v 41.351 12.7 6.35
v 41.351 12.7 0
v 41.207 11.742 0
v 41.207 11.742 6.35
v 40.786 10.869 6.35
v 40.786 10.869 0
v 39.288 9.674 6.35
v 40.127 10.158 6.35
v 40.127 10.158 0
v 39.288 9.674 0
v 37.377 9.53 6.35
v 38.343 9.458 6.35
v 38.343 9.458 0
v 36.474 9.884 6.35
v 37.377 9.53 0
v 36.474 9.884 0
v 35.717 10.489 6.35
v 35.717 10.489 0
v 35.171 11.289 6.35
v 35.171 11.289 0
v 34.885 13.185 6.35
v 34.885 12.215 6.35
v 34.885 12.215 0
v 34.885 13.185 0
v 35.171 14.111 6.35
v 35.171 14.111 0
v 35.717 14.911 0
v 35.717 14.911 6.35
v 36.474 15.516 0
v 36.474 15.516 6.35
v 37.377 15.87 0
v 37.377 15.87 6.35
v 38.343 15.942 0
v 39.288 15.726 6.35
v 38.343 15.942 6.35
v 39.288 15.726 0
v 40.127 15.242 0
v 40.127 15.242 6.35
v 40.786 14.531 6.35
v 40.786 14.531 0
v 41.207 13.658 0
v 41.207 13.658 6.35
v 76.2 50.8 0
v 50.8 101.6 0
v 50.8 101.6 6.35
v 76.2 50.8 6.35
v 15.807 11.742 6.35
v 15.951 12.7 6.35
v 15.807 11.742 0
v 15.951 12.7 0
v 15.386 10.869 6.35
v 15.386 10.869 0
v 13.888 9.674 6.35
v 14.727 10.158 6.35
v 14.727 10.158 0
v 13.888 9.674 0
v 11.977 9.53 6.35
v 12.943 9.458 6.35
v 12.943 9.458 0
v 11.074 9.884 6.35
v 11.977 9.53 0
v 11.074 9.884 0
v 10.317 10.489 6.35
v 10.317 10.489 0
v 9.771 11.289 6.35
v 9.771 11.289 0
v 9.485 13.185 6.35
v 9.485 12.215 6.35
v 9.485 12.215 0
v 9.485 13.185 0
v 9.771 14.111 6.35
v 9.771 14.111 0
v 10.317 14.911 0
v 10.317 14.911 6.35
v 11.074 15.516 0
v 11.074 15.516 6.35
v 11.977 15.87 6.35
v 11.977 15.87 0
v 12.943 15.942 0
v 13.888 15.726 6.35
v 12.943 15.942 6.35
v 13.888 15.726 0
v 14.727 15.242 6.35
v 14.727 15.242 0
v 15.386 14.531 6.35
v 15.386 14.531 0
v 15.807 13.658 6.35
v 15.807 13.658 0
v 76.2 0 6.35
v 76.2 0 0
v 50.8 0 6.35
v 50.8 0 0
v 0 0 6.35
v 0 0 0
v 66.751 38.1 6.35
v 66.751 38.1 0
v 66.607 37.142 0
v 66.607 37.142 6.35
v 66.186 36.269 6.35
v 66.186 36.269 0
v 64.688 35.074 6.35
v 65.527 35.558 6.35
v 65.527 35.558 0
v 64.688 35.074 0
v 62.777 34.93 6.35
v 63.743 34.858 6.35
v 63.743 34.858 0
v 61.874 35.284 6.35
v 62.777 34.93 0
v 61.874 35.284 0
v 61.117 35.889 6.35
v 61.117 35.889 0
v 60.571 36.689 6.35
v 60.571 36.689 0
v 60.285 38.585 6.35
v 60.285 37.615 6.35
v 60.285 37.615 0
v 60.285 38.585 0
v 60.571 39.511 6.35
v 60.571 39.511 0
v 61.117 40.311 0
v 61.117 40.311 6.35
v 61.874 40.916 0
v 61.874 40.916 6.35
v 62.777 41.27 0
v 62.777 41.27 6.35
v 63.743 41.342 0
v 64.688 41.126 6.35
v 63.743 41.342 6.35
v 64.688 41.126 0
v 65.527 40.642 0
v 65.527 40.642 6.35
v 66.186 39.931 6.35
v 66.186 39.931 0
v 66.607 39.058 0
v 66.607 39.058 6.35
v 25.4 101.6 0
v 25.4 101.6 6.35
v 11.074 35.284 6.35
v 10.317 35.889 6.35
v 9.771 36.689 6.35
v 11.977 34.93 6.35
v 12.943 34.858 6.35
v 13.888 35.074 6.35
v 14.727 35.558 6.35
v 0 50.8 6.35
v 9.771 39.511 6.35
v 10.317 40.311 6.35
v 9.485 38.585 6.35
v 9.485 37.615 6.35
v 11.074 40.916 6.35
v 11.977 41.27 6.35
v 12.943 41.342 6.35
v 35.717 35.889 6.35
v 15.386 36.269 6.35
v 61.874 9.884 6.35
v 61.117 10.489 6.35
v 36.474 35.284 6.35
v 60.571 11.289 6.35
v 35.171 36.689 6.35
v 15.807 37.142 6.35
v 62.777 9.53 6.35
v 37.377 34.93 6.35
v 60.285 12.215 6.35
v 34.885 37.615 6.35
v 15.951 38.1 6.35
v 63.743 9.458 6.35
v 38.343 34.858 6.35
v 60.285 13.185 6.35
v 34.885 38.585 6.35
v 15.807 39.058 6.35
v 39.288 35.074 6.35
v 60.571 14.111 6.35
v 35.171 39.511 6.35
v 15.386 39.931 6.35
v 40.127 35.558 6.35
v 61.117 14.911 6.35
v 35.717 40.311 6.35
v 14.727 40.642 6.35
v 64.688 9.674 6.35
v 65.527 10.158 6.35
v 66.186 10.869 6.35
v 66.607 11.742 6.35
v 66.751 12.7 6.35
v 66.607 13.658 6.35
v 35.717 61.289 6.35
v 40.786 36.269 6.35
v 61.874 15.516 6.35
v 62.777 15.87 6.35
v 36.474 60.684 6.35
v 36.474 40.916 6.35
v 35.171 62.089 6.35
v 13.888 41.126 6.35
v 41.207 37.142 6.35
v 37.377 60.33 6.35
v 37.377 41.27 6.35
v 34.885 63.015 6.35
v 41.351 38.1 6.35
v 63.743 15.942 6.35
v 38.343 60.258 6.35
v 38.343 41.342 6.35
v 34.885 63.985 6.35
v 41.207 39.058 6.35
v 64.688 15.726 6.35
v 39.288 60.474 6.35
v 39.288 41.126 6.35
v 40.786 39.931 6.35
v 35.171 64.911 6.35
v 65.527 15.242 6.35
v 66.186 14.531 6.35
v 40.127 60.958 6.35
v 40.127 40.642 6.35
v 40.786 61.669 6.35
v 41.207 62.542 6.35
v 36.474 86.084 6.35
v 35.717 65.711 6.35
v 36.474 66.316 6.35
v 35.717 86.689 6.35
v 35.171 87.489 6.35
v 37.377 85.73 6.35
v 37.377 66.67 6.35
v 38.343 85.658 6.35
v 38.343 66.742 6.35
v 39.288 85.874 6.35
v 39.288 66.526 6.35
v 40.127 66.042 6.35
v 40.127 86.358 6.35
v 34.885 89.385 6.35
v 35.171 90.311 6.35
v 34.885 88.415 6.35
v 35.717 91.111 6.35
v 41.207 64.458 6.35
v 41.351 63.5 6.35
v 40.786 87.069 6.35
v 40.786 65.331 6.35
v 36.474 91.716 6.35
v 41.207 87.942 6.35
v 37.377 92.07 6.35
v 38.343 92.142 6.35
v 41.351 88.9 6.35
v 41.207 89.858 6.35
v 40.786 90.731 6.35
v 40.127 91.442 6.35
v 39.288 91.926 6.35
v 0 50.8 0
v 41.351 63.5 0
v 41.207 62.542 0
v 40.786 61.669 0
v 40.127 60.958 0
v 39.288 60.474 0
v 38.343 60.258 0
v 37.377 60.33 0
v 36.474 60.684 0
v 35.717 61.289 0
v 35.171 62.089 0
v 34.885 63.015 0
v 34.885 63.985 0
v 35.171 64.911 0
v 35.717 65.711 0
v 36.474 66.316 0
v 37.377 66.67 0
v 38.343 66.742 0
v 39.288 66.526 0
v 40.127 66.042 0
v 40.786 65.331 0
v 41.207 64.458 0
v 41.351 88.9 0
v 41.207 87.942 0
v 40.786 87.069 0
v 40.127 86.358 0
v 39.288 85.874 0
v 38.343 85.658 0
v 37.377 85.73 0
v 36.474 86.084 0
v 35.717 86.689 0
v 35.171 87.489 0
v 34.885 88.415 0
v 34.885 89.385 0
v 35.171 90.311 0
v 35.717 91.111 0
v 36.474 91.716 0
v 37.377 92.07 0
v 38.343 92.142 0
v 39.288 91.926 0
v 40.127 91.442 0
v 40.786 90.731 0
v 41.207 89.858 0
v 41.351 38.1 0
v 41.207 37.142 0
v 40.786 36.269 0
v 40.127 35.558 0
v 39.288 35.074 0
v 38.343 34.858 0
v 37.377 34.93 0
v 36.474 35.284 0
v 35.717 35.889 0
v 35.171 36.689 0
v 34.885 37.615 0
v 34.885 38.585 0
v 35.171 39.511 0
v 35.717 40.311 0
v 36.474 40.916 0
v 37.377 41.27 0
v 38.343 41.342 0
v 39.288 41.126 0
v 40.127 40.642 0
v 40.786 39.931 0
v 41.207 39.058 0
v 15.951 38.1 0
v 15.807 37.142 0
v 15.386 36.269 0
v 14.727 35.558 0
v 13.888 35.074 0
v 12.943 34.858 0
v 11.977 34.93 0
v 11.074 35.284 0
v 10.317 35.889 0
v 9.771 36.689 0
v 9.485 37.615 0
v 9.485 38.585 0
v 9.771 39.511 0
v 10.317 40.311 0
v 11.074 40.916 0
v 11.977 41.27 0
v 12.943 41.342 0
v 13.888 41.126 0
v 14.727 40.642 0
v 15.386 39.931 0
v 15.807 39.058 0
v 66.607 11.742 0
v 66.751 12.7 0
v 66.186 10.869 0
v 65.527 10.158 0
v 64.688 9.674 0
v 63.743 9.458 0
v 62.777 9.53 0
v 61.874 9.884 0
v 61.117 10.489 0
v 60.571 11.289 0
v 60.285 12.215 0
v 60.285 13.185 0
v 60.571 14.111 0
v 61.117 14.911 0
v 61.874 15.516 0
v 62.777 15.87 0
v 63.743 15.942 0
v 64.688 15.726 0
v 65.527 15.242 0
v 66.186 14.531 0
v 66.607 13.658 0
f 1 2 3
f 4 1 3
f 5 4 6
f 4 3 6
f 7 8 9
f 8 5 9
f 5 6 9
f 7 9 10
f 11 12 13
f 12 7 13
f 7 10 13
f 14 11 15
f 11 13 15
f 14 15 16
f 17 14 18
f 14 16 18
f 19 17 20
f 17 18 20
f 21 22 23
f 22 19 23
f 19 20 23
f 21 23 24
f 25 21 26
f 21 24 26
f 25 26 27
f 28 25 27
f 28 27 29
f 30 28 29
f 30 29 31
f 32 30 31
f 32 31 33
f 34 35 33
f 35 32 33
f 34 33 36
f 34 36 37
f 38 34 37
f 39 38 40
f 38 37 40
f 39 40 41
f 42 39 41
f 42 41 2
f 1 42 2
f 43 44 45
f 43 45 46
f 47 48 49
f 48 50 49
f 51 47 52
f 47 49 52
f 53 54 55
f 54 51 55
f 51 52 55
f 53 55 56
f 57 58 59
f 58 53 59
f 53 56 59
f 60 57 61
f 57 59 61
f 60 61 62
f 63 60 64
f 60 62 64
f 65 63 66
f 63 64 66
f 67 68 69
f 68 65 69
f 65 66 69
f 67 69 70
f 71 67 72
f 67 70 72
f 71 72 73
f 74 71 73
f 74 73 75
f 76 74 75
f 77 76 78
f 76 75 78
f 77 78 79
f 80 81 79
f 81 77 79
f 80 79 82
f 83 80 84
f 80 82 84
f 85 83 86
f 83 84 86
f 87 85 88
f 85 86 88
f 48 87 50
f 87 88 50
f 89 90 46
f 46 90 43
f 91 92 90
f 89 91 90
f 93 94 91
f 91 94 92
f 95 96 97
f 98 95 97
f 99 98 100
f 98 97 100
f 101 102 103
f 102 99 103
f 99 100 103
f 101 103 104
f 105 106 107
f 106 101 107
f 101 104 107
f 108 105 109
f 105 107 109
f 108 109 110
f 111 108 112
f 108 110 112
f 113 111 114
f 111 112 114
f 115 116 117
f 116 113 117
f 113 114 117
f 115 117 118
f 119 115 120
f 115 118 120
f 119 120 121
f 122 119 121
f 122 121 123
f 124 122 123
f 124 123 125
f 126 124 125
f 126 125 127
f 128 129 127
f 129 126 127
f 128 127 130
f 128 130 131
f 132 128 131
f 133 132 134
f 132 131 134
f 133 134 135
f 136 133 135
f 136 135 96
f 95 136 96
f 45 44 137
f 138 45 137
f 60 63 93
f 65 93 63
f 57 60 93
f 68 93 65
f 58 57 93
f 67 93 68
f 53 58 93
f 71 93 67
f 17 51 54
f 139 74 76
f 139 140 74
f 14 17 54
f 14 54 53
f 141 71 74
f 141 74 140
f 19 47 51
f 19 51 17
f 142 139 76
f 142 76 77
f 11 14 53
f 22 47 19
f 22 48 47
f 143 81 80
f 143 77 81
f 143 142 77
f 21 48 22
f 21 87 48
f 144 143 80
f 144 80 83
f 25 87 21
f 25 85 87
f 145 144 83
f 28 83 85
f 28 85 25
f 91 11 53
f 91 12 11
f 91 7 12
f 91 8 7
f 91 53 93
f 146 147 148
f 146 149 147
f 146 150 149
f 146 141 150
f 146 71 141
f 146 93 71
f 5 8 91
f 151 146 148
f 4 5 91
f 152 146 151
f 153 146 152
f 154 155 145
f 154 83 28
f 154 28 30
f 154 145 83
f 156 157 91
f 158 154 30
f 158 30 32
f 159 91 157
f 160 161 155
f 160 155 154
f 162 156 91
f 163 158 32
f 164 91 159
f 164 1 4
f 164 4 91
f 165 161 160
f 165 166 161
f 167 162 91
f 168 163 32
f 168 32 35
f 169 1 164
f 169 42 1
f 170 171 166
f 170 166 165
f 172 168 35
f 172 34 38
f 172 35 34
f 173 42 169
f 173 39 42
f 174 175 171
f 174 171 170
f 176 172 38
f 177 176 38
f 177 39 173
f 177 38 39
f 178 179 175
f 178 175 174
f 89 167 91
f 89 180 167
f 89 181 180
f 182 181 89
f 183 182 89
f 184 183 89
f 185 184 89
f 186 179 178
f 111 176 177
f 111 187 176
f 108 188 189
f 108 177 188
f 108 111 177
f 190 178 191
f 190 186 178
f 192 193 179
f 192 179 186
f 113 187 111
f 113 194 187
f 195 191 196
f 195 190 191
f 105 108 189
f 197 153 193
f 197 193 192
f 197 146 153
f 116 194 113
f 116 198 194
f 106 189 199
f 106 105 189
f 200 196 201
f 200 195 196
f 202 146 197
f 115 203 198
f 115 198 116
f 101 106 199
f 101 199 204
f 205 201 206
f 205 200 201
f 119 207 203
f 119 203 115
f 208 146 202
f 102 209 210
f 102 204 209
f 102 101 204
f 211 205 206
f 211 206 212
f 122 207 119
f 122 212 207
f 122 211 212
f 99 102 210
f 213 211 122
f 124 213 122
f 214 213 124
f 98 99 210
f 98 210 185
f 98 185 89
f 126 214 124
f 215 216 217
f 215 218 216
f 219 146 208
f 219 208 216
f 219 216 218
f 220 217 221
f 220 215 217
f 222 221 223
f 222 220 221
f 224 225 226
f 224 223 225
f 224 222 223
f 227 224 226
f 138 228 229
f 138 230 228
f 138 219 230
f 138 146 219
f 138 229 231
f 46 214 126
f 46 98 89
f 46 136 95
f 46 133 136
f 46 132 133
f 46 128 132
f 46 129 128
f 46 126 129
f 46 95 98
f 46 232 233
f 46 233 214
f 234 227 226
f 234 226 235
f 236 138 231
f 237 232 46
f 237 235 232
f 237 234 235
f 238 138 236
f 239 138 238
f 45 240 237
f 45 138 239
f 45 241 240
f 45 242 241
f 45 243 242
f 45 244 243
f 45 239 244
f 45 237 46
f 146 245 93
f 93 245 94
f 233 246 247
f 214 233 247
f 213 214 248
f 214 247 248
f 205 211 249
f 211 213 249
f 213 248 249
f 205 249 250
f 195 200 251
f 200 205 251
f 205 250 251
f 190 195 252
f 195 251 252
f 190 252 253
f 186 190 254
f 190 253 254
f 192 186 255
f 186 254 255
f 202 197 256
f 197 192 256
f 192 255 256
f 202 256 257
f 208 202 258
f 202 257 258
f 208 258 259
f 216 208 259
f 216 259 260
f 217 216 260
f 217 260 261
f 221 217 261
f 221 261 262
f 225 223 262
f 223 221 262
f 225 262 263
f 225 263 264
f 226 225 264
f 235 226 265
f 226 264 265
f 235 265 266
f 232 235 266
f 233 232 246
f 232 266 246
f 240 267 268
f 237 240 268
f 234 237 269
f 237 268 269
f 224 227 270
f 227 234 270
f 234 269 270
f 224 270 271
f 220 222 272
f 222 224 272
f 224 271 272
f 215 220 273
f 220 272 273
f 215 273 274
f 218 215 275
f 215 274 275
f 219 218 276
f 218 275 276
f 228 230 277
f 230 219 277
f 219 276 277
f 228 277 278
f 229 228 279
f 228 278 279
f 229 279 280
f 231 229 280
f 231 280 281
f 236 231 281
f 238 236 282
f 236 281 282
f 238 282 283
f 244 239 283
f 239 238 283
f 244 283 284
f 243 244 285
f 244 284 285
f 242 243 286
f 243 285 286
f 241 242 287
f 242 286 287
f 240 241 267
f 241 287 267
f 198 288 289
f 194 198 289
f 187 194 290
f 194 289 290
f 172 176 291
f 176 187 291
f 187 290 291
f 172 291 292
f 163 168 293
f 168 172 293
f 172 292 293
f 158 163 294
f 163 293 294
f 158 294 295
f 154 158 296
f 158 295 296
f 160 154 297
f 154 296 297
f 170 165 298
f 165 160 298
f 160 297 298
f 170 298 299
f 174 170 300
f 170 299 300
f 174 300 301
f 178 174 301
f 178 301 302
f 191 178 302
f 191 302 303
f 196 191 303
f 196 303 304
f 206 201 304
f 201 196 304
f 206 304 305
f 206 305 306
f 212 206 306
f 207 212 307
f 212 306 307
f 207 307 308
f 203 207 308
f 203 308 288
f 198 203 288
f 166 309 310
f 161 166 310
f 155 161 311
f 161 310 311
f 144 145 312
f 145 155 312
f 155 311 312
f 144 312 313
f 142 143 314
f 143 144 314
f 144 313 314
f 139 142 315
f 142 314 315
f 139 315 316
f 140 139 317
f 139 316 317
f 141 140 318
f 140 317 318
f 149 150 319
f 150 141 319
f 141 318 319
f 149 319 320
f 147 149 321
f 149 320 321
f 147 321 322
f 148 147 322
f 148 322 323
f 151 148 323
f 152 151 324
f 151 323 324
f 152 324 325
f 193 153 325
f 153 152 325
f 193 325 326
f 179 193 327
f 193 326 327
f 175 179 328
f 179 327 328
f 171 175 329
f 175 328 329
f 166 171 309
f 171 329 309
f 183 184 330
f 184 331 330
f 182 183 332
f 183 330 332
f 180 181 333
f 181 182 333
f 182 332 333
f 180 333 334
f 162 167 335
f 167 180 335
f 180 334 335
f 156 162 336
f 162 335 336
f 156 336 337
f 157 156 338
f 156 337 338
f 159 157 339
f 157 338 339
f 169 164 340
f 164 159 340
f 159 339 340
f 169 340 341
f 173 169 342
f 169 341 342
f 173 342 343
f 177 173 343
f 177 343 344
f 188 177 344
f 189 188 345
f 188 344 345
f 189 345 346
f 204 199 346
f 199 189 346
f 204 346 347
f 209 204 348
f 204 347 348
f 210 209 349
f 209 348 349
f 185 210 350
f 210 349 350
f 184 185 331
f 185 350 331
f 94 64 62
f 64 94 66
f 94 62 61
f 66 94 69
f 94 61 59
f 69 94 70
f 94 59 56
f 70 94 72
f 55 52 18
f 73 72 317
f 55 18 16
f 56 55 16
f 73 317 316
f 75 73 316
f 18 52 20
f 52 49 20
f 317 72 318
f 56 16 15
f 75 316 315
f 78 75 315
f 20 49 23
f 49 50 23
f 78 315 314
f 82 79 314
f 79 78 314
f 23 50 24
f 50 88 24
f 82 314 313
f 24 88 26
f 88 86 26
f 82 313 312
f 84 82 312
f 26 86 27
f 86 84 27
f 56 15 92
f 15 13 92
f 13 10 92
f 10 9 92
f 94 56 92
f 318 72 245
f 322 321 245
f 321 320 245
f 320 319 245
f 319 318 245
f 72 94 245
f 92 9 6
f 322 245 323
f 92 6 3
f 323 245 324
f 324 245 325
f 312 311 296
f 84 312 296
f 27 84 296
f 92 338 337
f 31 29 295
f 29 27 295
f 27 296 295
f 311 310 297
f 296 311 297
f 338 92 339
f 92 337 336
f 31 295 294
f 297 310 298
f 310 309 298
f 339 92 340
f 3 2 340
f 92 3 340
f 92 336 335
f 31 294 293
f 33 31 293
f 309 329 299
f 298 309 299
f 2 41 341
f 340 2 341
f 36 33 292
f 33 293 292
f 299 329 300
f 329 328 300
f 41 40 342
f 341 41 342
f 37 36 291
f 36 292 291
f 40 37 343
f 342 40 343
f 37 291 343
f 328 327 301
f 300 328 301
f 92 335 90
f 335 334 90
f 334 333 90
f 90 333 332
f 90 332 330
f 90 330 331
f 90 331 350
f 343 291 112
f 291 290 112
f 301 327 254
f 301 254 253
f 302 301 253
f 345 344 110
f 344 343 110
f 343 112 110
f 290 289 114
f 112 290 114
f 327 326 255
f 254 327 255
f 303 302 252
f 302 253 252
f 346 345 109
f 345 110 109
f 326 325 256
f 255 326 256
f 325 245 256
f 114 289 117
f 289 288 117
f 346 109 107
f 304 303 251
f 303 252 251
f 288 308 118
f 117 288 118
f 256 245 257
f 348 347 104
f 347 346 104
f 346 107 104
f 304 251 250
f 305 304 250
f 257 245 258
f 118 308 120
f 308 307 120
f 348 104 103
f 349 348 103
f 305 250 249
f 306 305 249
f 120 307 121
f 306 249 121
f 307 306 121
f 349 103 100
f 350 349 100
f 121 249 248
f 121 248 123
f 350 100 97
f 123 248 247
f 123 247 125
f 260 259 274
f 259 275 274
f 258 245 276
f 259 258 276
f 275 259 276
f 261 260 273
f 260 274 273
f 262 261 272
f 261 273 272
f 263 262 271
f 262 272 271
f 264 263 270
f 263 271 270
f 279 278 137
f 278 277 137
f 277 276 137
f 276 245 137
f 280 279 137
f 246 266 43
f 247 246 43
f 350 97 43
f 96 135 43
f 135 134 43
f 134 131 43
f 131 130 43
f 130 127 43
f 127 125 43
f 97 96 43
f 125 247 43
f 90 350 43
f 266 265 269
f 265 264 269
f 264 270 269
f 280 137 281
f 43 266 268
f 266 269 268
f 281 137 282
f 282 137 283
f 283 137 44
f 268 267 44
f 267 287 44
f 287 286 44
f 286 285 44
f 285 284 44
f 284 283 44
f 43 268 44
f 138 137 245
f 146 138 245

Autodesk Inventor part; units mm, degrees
ref_plane "YZ Plane" through (0, 0, 0) normal (1, 0, 0) x (0, 1, 0)
ref_plane "XZ Plane" through (0, 0, 0) normal (0, 1, 0) x (-1, 0, 0)
ref_plane "XY Plane" through (0, 0, 0) normal (0, 0, 1) x (1, 0, 0)
sketch "Sketch1" plane through (0, 0, 0) normal (0, 0, 1) x (1, 0, 0)
  line L0 (0, 0) -> (76.2, 0)
  line L1 (76.2, 0) -> (76.2, 50.8)
  line L2 (0, 50.8) -> (0, 0)
  line L3 (0, 0) -> (50.8, 0)
  line L4 (50.8, 101.6) -> (25.4, 101.6)
  line L5 (0, 50.8) -> (0, 0)
  line L6 (25.4, 101.6) -> (0, 50.8)
  line L7 (50.8, 101.6) -> (76.2, 50.8)
  line L8 (76.2, 50.8) -> (0, 50.8) construction
  circle A0 centre (12.7, 12.7) radius 3.2512
  circle A1 centre (12.7, 38.1) radius 3.2512
  circle A2 centre (38.1, 12.7) radius 3.2512
  circle A3 centre (38.1, 38.1) radius 3.2512
  circle A4 centre (63.5, 12.7) radius 3.2512
  circle A5 centre (63.5, 38.1) radius 3.2512
  circle A6 centre (38.1, 63.5) radius 3.2512
  circle A7 centre (38.1, 88.9) radius 3.2512
  dimension "d10" = 50.8
  dimension "d13" = 76.2
  dimension "d14" = 25.4
  dimension "d15" = 25.4
  dimension "d16" = 50.8
  dimension "d17" = 6.5024
  dimension "d18" = 12.7
  dimension "d19" = 12.7
  dimension "d22" = 25.4
  dimension "d25" = 25.4
  dimension "d30" = 25.4
extrude "Extrusion1" add sketch "Sketch1" along normal blind 6.35
properties part number "1x3 t plate"
